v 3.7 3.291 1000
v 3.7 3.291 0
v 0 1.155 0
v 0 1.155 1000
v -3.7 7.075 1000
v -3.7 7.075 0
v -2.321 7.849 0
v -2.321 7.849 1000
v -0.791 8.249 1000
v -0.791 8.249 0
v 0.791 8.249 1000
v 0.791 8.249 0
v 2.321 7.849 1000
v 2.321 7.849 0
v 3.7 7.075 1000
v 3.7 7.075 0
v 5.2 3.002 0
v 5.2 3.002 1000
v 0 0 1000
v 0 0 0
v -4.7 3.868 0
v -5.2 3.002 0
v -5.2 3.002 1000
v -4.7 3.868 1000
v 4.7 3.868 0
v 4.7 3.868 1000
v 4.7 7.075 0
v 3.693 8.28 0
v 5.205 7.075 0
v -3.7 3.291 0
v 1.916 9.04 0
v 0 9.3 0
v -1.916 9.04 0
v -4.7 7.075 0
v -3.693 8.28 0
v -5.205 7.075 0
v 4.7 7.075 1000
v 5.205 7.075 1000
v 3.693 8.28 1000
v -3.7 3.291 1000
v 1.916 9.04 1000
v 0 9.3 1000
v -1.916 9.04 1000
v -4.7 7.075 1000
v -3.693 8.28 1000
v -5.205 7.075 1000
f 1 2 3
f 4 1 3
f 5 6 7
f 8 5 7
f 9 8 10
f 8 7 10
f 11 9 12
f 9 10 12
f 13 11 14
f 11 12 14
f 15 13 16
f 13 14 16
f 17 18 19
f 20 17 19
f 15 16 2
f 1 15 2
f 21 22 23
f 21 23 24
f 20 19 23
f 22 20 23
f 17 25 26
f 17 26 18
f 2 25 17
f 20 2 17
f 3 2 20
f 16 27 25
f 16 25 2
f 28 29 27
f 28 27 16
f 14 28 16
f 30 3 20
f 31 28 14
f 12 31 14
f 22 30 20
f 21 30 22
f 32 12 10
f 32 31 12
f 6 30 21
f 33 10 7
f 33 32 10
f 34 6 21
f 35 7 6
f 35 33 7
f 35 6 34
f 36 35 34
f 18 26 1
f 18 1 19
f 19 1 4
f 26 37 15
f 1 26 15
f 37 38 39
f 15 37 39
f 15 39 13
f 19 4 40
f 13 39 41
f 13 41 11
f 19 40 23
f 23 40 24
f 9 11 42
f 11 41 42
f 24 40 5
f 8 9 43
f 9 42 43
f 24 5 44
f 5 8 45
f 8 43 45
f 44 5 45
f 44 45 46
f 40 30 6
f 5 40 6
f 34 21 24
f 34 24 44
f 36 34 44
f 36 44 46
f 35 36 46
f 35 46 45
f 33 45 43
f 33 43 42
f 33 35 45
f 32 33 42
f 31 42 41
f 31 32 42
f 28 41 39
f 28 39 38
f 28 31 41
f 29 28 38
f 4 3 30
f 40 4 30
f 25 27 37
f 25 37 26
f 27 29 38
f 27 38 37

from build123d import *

# Parameters (mm, degrees)
EXTRUDE_1_DEPTH = 1000


with BuildPart() as part:
    # Эскиз1 → Бобышка-Вытянуть1 (new body)
    with BuildSketch(Plane.XY):
        with BuildLine():
            Line((0, 0), (-5.2, 3.0022214))
            Line((-5.2, 3.0022214), (-4.7, 3.868246804))
            Line((-4.7, 3.868246804), (-4.7, 7.074937186))
            Line((-4.7, 7.074937186), (-5.204805472, 7.074937186))
            ThreePointArc((-5.204805472, 7.074937186), (0, 9.3), (5.204805472, 7.074937186))
            Line((5.204805472, 7.074937186), (4.7, 7.074937186))
            Line((4.7, 7.074937186), (4.7, 3.868246804))
            Line((4.7, 3.868246804), (5.2, 3.0022214))
            Line((5.2, 3.0022214), (0, 0))
        make_face()
        with BuildLine():
            Line((0, 1.154700538), (-3.7, 3.290896534))
            Line((-3.7, 3.290896534), (-3.7, 7.074937186))
            ThreePointArc((-3.7, 7.074937186), (0, 8.3), (3.7, 7.074937186))
            Line((3.7, 7.074937186), (3.7, 3.290896534))
            Line((3.7, 3.290896534), (0, 1.154700538))
        make_face(mode=Mode.SUBTRACT)
    extrude(amount=EXTRUDE_1_DEPTH)


solid = part.part
